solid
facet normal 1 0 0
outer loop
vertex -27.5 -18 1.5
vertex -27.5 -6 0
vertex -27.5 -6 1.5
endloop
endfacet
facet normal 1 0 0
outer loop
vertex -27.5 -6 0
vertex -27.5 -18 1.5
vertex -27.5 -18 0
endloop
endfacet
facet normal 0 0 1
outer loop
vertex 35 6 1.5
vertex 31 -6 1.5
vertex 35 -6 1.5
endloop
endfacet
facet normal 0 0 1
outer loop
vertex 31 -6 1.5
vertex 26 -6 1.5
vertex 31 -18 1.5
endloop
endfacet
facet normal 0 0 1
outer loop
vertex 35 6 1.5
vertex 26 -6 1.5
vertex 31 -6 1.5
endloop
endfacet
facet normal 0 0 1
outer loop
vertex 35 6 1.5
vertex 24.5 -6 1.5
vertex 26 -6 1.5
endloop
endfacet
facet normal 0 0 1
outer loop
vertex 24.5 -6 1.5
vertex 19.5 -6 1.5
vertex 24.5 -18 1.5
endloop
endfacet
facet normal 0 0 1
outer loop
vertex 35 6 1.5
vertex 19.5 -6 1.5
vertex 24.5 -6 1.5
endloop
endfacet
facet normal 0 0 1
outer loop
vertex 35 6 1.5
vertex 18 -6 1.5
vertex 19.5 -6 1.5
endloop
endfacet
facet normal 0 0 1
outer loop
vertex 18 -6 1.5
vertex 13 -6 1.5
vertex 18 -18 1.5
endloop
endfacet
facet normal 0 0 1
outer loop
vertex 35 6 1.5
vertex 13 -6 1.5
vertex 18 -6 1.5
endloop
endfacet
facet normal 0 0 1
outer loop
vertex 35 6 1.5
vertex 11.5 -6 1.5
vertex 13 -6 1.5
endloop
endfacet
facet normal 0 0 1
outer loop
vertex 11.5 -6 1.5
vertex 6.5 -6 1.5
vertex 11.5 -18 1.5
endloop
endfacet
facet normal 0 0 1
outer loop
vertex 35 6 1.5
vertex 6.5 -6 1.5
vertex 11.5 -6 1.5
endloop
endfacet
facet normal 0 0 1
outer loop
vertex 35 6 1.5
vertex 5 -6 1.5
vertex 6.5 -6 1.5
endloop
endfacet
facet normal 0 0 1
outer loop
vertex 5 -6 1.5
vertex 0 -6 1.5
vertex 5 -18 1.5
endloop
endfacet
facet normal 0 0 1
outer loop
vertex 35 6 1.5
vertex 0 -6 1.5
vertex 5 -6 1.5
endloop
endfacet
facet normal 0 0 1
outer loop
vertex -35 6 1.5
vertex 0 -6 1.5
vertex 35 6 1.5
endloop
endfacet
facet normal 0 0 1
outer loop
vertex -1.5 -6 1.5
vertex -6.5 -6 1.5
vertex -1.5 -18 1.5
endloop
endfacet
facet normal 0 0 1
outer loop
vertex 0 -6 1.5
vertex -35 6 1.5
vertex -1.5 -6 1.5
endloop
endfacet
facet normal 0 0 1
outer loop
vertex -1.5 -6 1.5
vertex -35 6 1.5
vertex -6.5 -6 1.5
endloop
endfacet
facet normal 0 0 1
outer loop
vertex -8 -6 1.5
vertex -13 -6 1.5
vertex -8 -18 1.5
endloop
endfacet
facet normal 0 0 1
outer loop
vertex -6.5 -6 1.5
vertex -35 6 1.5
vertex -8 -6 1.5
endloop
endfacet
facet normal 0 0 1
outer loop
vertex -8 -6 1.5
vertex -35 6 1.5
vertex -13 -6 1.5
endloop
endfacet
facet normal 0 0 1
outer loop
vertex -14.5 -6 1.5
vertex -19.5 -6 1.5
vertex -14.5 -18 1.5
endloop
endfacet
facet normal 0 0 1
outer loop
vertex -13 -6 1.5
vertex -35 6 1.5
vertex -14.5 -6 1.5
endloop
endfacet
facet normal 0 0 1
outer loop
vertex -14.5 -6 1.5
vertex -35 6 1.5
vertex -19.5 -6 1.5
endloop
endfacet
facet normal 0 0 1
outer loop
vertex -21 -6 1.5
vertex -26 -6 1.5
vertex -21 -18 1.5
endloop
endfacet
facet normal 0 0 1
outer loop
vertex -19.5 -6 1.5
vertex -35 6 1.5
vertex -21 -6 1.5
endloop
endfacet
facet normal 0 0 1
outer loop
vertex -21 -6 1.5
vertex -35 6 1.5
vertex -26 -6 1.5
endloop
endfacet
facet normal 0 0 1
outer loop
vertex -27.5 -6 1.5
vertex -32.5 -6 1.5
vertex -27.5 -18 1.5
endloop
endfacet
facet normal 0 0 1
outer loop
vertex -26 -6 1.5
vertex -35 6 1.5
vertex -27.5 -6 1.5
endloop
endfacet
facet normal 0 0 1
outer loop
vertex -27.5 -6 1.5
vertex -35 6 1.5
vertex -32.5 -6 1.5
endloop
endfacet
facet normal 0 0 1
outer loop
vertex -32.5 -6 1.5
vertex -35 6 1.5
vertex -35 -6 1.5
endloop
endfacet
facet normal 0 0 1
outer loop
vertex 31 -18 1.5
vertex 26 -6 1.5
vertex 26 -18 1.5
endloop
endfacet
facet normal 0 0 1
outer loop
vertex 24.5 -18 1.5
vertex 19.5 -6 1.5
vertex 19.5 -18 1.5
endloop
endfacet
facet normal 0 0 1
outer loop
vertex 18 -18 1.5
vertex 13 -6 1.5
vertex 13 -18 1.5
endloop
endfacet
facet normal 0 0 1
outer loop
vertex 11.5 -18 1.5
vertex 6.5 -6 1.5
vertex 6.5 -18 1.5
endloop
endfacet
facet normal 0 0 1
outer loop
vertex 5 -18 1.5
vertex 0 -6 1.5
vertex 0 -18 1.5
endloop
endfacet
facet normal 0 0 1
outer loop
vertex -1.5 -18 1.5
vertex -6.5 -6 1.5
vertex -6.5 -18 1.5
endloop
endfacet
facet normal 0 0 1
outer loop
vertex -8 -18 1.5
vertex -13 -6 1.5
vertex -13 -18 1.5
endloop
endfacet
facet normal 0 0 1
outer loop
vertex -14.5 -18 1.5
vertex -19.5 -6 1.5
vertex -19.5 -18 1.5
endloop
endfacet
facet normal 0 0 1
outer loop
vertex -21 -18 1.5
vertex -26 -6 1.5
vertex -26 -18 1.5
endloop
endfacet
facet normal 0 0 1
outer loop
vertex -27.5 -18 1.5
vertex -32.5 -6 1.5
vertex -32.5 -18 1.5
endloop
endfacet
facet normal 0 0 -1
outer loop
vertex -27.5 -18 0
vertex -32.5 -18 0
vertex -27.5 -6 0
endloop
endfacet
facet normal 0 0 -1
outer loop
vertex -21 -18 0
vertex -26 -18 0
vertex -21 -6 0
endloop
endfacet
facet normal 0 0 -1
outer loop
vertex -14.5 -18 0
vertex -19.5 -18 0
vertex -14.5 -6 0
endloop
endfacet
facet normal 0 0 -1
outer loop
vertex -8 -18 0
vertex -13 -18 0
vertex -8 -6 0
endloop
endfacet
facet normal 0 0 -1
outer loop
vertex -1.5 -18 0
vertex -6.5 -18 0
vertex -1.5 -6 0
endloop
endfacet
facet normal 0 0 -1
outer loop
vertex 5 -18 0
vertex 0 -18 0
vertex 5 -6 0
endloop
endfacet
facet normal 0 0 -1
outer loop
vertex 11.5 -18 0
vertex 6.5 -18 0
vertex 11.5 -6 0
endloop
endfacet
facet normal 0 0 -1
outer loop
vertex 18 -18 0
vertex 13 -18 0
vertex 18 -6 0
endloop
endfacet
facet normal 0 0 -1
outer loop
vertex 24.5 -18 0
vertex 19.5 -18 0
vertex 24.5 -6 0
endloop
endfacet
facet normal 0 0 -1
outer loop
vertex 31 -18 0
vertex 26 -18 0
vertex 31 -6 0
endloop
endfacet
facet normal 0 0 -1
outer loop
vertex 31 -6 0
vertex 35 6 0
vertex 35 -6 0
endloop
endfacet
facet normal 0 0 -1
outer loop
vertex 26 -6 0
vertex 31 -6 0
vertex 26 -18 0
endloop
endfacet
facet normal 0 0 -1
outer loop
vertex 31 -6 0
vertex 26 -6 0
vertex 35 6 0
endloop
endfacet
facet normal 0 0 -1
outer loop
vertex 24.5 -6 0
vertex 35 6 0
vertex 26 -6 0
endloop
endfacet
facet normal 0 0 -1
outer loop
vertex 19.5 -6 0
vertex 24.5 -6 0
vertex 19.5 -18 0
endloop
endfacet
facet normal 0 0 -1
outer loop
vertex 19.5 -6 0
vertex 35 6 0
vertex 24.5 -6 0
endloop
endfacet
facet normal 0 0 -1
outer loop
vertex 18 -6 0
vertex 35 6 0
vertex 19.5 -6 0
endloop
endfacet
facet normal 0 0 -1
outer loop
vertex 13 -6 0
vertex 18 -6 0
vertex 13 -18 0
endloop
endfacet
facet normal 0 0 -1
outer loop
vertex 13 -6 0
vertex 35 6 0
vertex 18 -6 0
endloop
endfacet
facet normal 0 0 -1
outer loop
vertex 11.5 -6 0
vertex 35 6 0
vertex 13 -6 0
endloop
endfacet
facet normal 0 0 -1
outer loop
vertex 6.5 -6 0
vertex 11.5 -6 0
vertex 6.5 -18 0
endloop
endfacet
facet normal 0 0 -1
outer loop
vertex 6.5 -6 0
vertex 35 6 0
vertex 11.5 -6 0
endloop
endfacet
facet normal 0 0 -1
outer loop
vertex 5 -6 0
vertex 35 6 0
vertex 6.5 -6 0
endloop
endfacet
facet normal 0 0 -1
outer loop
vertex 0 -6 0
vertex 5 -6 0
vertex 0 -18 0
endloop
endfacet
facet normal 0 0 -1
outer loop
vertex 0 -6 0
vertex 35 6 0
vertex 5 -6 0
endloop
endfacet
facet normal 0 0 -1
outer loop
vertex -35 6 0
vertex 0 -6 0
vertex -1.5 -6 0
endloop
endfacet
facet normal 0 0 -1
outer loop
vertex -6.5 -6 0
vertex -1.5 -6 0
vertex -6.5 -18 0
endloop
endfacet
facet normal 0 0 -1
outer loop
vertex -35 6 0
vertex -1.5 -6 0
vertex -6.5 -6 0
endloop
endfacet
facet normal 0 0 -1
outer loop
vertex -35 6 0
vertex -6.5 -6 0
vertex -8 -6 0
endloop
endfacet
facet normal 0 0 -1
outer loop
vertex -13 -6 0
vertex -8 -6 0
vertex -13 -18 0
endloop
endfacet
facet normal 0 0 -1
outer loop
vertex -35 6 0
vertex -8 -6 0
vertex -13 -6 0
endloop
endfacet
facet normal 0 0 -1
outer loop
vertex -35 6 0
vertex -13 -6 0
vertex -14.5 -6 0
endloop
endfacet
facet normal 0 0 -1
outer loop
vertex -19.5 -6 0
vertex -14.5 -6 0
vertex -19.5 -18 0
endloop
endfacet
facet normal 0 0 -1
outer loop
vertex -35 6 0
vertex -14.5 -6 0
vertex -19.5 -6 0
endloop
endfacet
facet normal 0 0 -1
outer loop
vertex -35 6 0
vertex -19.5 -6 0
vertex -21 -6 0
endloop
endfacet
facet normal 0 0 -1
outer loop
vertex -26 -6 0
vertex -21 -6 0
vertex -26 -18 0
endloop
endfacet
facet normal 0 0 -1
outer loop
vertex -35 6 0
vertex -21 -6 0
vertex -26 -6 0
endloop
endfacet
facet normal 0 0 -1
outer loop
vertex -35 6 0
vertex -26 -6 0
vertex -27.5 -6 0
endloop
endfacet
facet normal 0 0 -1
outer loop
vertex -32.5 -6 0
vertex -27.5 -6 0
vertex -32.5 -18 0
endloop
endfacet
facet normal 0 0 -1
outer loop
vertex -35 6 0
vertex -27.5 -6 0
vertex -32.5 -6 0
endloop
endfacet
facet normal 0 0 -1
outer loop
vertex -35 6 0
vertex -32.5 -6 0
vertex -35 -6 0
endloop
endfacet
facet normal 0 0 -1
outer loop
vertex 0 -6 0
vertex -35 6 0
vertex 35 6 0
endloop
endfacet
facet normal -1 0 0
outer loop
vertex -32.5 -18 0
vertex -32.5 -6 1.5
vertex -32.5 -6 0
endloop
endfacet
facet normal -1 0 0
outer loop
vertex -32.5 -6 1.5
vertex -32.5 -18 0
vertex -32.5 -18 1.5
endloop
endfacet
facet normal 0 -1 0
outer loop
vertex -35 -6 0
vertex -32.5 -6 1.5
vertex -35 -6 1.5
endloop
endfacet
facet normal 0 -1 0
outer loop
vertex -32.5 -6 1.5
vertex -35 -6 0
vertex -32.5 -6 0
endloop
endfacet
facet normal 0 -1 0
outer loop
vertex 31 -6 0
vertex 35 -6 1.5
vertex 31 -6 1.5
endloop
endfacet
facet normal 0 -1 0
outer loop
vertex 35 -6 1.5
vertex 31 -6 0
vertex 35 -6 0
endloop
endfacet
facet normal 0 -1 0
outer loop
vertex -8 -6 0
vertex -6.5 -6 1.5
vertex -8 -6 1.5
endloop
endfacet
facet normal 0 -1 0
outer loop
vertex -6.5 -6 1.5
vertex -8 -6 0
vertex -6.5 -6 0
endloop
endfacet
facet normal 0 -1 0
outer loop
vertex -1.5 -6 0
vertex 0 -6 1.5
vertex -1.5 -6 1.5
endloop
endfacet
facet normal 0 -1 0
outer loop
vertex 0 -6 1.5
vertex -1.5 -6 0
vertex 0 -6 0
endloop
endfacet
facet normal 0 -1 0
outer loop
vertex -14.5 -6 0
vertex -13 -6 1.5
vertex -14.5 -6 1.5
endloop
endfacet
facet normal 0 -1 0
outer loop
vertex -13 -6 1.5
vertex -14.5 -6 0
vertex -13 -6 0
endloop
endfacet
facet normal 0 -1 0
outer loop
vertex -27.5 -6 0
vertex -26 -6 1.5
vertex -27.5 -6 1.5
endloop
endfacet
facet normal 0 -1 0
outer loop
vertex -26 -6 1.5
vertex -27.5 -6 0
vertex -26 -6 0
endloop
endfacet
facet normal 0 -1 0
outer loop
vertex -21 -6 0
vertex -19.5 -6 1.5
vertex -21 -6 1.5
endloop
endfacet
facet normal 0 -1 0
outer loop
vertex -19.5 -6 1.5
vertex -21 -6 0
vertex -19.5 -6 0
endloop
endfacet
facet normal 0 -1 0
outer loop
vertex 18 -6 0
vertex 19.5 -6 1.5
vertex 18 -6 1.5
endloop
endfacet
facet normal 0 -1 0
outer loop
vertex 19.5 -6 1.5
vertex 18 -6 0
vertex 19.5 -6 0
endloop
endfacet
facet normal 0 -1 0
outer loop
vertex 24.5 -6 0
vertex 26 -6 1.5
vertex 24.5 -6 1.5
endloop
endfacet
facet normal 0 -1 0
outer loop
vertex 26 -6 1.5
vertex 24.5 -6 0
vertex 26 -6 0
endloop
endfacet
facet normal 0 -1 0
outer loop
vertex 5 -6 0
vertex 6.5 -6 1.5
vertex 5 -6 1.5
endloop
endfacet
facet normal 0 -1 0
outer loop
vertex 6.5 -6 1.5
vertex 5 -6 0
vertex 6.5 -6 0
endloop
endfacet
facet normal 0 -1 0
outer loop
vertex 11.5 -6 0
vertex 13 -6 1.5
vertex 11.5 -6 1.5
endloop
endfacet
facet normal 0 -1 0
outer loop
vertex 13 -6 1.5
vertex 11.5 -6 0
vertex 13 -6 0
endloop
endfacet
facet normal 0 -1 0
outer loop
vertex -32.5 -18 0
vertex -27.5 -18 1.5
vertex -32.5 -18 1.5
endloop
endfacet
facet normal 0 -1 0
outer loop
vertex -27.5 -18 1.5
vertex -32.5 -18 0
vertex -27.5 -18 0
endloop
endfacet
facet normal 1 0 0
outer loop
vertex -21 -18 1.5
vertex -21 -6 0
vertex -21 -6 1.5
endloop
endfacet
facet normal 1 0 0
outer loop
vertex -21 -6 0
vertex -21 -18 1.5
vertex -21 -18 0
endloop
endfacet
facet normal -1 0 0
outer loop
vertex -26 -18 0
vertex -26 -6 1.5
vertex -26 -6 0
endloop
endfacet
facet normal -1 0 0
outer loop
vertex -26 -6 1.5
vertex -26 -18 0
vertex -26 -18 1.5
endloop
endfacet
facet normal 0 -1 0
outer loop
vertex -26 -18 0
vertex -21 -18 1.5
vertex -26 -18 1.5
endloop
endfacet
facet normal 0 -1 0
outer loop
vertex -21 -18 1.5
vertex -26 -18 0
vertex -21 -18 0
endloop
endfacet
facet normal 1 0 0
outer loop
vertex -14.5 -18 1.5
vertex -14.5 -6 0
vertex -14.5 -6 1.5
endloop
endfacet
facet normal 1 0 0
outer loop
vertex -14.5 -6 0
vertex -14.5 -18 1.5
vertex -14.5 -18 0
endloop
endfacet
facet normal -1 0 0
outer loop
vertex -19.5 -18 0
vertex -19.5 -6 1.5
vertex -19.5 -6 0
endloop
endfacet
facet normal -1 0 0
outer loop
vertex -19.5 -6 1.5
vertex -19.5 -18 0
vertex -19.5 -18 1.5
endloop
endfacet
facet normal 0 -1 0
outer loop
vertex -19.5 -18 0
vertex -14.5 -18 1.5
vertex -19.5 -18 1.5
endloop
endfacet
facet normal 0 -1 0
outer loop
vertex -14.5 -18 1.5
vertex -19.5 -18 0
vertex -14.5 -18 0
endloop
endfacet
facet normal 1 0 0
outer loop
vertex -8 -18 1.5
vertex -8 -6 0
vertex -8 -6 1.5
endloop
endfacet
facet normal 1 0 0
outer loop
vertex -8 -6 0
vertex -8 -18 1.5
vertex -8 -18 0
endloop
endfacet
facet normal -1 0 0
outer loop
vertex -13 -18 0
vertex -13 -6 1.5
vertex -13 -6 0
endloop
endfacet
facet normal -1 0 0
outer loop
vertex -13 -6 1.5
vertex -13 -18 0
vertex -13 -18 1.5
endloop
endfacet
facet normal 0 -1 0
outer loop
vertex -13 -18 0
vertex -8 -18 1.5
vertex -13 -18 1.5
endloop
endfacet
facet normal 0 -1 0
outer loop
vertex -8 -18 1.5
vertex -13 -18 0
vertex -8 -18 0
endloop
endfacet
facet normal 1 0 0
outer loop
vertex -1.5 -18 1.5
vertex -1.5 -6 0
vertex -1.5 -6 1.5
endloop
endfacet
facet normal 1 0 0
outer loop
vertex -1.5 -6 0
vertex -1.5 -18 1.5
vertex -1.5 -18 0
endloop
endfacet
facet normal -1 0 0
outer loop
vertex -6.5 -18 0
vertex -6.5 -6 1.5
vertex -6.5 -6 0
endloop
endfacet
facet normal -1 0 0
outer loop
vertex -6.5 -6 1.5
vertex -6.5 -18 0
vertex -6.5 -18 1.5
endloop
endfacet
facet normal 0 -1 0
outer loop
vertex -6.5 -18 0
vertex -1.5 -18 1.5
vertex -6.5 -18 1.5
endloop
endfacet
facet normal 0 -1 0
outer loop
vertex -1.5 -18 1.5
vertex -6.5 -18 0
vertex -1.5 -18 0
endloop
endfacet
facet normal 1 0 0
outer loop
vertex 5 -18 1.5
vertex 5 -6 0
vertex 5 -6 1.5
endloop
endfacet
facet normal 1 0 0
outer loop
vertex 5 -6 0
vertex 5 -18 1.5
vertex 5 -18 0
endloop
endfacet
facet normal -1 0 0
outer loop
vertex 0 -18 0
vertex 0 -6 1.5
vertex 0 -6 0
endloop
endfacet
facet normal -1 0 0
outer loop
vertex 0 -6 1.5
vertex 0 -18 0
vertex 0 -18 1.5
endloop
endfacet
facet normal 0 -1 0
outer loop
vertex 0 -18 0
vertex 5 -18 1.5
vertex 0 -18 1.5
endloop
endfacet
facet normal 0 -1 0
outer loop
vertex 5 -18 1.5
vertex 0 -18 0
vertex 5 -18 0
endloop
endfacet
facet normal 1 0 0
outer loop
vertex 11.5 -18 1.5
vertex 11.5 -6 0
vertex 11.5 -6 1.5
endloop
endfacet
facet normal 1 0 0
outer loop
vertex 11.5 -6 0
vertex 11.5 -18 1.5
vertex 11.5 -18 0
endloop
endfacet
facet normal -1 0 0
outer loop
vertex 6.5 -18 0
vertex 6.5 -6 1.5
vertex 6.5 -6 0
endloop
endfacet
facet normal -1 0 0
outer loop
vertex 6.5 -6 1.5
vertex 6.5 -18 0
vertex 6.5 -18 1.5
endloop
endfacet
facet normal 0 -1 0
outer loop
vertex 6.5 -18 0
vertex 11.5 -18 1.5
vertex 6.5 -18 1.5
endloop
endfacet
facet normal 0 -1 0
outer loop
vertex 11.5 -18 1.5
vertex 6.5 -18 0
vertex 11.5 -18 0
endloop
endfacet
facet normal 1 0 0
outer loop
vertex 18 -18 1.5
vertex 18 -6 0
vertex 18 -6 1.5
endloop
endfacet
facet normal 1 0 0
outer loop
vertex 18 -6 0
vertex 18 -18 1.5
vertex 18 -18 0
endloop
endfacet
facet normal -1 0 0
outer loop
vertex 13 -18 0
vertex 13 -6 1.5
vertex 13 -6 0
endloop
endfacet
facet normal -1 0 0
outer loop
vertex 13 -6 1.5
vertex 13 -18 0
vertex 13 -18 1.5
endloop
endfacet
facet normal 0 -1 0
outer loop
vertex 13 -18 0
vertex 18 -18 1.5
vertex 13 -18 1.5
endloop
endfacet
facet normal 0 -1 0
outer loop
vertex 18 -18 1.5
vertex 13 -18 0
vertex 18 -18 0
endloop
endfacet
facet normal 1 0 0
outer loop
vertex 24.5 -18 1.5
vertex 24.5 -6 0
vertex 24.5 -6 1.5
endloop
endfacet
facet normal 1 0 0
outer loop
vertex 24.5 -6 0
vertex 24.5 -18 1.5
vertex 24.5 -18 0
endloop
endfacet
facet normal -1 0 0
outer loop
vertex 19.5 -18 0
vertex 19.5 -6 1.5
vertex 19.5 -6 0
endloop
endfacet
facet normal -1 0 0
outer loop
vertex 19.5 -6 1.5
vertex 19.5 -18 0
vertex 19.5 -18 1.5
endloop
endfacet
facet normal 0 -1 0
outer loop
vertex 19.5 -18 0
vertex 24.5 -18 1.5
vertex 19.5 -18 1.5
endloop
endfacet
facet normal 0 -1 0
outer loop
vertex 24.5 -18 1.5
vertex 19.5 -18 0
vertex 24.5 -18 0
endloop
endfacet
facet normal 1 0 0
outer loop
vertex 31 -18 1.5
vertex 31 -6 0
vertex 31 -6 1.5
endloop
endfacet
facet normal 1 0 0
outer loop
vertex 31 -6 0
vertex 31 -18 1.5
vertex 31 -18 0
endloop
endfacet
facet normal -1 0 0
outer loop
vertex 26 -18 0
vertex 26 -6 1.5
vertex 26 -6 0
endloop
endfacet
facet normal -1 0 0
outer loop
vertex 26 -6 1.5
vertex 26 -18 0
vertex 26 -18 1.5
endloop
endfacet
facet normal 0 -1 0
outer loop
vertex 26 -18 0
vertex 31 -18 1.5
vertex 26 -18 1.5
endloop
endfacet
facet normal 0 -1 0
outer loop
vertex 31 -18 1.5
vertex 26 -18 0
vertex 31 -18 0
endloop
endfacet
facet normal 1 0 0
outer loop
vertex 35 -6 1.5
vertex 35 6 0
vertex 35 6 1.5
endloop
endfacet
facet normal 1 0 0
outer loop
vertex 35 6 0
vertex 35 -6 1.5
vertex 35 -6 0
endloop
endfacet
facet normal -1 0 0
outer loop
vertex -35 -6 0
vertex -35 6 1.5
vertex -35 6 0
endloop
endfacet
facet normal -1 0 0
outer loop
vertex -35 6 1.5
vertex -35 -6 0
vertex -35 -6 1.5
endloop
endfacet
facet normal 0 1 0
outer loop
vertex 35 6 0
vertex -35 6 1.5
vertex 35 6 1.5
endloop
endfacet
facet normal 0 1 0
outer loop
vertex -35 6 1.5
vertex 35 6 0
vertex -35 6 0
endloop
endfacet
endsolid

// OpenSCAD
// 10-well comb for agarose gel casting, printed lying flat
// Units: mm

$fn = 64;

// Plate / spine
plate_len   = 70;   // spine length (X)
plate_wid   = 12;   // spine width (Y)
plate_thk   = 1.5;  // plate thickness (Z)

// Teeth
teeth_n     = 10;   // number of teeth
teeth_w     = 5.0;  // tooth width (X)
teeth_l     = 12;   // tooth length (Y)
teeth_gap   = 1.5;  // gap between teeth (X)

// Derived
teeth_total_w = teeth_n * teeth_w + (teeth_n + 1) * teeth_gap; // row width including end gaps

union() {
    // Spine (back bar)
    translate([-plate_len / 2, -plate_wid / 2, 0])
        cube([plate_len, plate_wid, plate_thk]);

    // Teeth hanging in -Y from one long edge
    for (i = [0 : teeth_n - 1]) {
        translate([-plate_len / 2 + teeth_w / 2 + i * (teeth_w + teeth_gap),
                   -plate_wid / 2 - teeth_l,
                   0])
            cube([teeth_w, teeth_l, plate_thk]);
    }
}
